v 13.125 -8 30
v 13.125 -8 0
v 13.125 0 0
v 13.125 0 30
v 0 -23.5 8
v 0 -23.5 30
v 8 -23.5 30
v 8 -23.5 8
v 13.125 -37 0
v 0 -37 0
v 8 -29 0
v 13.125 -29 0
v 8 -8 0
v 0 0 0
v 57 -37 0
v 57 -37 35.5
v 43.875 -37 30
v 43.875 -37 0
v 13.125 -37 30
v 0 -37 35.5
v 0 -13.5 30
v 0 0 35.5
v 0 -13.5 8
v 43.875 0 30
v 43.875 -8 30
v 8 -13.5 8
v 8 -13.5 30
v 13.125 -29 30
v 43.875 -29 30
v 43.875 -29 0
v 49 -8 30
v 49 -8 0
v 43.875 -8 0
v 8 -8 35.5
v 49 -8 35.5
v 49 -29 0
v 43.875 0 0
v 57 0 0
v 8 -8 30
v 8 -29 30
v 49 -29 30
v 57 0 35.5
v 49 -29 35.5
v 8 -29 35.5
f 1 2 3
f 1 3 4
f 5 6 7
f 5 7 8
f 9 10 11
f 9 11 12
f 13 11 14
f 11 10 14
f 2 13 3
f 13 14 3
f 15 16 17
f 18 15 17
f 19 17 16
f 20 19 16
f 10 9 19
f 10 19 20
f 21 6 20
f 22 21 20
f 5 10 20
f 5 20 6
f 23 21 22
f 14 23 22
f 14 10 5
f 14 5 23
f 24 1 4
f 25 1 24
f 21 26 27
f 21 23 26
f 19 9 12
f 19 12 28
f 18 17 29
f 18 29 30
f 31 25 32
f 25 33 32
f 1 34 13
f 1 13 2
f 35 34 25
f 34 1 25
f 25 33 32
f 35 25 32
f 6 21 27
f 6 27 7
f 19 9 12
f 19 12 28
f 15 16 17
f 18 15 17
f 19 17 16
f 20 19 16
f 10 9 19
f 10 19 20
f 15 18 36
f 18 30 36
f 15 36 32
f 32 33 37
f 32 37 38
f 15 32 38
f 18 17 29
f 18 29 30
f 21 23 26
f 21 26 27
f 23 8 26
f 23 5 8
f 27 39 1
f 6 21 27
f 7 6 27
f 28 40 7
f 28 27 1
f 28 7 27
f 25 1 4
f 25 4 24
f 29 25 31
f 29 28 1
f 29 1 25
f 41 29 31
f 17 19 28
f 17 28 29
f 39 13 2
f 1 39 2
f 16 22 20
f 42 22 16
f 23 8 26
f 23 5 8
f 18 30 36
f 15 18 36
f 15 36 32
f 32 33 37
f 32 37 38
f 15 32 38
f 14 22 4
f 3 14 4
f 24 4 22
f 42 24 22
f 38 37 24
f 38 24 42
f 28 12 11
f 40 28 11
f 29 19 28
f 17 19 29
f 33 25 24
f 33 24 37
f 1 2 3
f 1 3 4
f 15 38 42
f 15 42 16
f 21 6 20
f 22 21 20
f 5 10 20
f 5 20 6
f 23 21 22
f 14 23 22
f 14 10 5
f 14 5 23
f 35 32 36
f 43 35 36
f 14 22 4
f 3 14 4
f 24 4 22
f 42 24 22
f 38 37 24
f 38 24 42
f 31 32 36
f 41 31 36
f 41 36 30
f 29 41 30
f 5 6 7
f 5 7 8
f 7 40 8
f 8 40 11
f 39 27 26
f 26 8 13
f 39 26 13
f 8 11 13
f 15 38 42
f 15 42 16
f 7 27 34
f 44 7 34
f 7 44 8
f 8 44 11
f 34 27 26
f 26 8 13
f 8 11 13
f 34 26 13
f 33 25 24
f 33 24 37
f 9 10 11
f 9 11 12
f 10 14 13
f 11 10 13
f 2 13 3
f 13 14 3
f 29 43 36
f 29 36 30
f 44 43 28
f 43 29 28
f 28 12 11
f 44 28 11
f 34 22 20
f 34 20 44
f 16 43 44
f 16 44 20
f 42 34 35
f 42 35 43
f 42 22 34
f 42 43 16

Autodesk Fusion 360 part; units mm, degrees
sketch "Sketch1" plane through (0, 0, 0) normal (0, 0, 1) x (1, 0, 0)
  line L0 (0, 0) -> (57, 0)
  line L1 (57, 0) -> (57, -37)
  line L2 (57, -37) -> (0, -37)
  line L3 (0, -37) -> (0, 0)
  line L4 (8, -8) -> (49, -8)
  line L5 (49, -8) -> (49, -29)
  line L6 (49, -29) -> (8, -29)
  line L7 (8, -29) -> (8, -8)
  dimension "d7" = 57
  dimension "d8" = 37
  dimension "d15" = 21
  dimension "d16" = 41
  dimension "d17" = 8
  dimension "d18" = 8
extrude "Extrude2" add sketch "Sketch1" along normal blind 35.5 makes body 1
extrude "Extrude1" add sketch "Sketch1" along normal blind 35.5 separate body contours L0 L1 L2 L3 | L4 L5 L6 L7 makes body 2
extrude "Extrude3" cut sketch "Sketch1" along normal blind 30 contours L4 L5 L6 L7 bodies 2
sketch "Sketch3" plane through (0, -37, 0) normal (0, -1, 0) x (1, 0, 0)
  line L0 (0, 0) -> (57, 0)
  line L1 (57, 0) -> (57, 35.5)
  line L2 (57, 35.5) -> (0, 35.5)
  line L3 (0, 35.5) -> (0, 0)
  line L4 (13.125, 30) -> (43.875, 30)
  line L5 (43.875, 30) -> (43.875, -5.5)
  line L6 (43.875, -5.5) -> (13.125, -5.5)
  line L7 (13.125, -5.5) -> (13.125, 30)
  dimension "d26" = 30.75
  dimension "d27" = 35.5
  dimension "d28" = 5.5
  dimension "d32" = 13.125
extrude "Extrude4" cut sketch "Sketch3" against normal blind 100 contours L0 L4 L5 L7 | L0 L5 L6 L7 bodies 1 2
sketch "Sketch4" plane through (0, 0, 0) normal (-1, 0, 0) x (0, -1, 0)
  line L0 (0, 0) -> (37, 0)
  line L1 (37, 0) -> (37, 35.5)
  line L2 (37, 35.5) -> (0, 35.5)
  line L3 (0, 35.5) -> (0, 0)
  line L4 (13.5, 30) -> (23.5, 30)
  line L5 (23.5, 30) -> (23.5, 8)
  line L6 (23.5, 8) -> (13.5, 8)
  line L7 (13.5, 8) -> (13.5, 30)
  line L8 (37, 0) -> (0, 0)
  line L9 (37, -5.5) -> (37, 30)
  dimension "d36" = 10
  dimension "d37" = 22
  dimension "d40" = 13.5
  dimension "d43" = 5.5
extrude "Extrude5" cut sketch "Sketch4" against normal blind 13 contours L4 L5 L6 L7 bodies 1 2
equation "bottom_thickness = 5.5 mm"
equation "side_thickness = 8 mm"
equation "outer_width = 37 mm"
equation "height = 30 mm + bottom_thickness"
equation "outer_length = 57 mm"
equation "inner_length = outer_length - 2 * side_thickness"
equation "d7 = outer_length"
equation "d8 = outer_width"
equation "d9 = height"
equation "inner_width = outer_width - 2 * side_thickness"
equation "d15 = inner_width"
equation "d16 = inner_length"
equation "d17 = side_thickness"
equation "d18 = side_thickness"
equation "d19 = height"
equation "d21 = height - bottom_thickness"
equation "big_side_gap = 3 * inner_length / 4"
equation "big_side_gap_distance = ( outer_length - big_side_gap ) / 2"
equation "extra = 100 mm"
equation "d26 = big_side_gap"
equation "d27 = height"
equation "d28 = bottom_thickness"
equation "d30 = -extra"
equation "d32 = big_side_gap_distance"
equation "small_side_gap_width = 22 mm"
equation "small_side_gap_length = 10 mm"
equation "small_side_gap_depth = side_thickness + 5 mm"
equation "d36 = small_side_gap_length"
equation "d37 = small_side_gap_width"
equation "small_side_gap_distance = ( outer_width - small_side_gap_length ) / 2"
equation "d40 = small_side_gap_distance"
equation "d41 = -small_side_gap_depth"
equation "d43 = bottom_thickness"
equation "cable_dent = 5 mm"
